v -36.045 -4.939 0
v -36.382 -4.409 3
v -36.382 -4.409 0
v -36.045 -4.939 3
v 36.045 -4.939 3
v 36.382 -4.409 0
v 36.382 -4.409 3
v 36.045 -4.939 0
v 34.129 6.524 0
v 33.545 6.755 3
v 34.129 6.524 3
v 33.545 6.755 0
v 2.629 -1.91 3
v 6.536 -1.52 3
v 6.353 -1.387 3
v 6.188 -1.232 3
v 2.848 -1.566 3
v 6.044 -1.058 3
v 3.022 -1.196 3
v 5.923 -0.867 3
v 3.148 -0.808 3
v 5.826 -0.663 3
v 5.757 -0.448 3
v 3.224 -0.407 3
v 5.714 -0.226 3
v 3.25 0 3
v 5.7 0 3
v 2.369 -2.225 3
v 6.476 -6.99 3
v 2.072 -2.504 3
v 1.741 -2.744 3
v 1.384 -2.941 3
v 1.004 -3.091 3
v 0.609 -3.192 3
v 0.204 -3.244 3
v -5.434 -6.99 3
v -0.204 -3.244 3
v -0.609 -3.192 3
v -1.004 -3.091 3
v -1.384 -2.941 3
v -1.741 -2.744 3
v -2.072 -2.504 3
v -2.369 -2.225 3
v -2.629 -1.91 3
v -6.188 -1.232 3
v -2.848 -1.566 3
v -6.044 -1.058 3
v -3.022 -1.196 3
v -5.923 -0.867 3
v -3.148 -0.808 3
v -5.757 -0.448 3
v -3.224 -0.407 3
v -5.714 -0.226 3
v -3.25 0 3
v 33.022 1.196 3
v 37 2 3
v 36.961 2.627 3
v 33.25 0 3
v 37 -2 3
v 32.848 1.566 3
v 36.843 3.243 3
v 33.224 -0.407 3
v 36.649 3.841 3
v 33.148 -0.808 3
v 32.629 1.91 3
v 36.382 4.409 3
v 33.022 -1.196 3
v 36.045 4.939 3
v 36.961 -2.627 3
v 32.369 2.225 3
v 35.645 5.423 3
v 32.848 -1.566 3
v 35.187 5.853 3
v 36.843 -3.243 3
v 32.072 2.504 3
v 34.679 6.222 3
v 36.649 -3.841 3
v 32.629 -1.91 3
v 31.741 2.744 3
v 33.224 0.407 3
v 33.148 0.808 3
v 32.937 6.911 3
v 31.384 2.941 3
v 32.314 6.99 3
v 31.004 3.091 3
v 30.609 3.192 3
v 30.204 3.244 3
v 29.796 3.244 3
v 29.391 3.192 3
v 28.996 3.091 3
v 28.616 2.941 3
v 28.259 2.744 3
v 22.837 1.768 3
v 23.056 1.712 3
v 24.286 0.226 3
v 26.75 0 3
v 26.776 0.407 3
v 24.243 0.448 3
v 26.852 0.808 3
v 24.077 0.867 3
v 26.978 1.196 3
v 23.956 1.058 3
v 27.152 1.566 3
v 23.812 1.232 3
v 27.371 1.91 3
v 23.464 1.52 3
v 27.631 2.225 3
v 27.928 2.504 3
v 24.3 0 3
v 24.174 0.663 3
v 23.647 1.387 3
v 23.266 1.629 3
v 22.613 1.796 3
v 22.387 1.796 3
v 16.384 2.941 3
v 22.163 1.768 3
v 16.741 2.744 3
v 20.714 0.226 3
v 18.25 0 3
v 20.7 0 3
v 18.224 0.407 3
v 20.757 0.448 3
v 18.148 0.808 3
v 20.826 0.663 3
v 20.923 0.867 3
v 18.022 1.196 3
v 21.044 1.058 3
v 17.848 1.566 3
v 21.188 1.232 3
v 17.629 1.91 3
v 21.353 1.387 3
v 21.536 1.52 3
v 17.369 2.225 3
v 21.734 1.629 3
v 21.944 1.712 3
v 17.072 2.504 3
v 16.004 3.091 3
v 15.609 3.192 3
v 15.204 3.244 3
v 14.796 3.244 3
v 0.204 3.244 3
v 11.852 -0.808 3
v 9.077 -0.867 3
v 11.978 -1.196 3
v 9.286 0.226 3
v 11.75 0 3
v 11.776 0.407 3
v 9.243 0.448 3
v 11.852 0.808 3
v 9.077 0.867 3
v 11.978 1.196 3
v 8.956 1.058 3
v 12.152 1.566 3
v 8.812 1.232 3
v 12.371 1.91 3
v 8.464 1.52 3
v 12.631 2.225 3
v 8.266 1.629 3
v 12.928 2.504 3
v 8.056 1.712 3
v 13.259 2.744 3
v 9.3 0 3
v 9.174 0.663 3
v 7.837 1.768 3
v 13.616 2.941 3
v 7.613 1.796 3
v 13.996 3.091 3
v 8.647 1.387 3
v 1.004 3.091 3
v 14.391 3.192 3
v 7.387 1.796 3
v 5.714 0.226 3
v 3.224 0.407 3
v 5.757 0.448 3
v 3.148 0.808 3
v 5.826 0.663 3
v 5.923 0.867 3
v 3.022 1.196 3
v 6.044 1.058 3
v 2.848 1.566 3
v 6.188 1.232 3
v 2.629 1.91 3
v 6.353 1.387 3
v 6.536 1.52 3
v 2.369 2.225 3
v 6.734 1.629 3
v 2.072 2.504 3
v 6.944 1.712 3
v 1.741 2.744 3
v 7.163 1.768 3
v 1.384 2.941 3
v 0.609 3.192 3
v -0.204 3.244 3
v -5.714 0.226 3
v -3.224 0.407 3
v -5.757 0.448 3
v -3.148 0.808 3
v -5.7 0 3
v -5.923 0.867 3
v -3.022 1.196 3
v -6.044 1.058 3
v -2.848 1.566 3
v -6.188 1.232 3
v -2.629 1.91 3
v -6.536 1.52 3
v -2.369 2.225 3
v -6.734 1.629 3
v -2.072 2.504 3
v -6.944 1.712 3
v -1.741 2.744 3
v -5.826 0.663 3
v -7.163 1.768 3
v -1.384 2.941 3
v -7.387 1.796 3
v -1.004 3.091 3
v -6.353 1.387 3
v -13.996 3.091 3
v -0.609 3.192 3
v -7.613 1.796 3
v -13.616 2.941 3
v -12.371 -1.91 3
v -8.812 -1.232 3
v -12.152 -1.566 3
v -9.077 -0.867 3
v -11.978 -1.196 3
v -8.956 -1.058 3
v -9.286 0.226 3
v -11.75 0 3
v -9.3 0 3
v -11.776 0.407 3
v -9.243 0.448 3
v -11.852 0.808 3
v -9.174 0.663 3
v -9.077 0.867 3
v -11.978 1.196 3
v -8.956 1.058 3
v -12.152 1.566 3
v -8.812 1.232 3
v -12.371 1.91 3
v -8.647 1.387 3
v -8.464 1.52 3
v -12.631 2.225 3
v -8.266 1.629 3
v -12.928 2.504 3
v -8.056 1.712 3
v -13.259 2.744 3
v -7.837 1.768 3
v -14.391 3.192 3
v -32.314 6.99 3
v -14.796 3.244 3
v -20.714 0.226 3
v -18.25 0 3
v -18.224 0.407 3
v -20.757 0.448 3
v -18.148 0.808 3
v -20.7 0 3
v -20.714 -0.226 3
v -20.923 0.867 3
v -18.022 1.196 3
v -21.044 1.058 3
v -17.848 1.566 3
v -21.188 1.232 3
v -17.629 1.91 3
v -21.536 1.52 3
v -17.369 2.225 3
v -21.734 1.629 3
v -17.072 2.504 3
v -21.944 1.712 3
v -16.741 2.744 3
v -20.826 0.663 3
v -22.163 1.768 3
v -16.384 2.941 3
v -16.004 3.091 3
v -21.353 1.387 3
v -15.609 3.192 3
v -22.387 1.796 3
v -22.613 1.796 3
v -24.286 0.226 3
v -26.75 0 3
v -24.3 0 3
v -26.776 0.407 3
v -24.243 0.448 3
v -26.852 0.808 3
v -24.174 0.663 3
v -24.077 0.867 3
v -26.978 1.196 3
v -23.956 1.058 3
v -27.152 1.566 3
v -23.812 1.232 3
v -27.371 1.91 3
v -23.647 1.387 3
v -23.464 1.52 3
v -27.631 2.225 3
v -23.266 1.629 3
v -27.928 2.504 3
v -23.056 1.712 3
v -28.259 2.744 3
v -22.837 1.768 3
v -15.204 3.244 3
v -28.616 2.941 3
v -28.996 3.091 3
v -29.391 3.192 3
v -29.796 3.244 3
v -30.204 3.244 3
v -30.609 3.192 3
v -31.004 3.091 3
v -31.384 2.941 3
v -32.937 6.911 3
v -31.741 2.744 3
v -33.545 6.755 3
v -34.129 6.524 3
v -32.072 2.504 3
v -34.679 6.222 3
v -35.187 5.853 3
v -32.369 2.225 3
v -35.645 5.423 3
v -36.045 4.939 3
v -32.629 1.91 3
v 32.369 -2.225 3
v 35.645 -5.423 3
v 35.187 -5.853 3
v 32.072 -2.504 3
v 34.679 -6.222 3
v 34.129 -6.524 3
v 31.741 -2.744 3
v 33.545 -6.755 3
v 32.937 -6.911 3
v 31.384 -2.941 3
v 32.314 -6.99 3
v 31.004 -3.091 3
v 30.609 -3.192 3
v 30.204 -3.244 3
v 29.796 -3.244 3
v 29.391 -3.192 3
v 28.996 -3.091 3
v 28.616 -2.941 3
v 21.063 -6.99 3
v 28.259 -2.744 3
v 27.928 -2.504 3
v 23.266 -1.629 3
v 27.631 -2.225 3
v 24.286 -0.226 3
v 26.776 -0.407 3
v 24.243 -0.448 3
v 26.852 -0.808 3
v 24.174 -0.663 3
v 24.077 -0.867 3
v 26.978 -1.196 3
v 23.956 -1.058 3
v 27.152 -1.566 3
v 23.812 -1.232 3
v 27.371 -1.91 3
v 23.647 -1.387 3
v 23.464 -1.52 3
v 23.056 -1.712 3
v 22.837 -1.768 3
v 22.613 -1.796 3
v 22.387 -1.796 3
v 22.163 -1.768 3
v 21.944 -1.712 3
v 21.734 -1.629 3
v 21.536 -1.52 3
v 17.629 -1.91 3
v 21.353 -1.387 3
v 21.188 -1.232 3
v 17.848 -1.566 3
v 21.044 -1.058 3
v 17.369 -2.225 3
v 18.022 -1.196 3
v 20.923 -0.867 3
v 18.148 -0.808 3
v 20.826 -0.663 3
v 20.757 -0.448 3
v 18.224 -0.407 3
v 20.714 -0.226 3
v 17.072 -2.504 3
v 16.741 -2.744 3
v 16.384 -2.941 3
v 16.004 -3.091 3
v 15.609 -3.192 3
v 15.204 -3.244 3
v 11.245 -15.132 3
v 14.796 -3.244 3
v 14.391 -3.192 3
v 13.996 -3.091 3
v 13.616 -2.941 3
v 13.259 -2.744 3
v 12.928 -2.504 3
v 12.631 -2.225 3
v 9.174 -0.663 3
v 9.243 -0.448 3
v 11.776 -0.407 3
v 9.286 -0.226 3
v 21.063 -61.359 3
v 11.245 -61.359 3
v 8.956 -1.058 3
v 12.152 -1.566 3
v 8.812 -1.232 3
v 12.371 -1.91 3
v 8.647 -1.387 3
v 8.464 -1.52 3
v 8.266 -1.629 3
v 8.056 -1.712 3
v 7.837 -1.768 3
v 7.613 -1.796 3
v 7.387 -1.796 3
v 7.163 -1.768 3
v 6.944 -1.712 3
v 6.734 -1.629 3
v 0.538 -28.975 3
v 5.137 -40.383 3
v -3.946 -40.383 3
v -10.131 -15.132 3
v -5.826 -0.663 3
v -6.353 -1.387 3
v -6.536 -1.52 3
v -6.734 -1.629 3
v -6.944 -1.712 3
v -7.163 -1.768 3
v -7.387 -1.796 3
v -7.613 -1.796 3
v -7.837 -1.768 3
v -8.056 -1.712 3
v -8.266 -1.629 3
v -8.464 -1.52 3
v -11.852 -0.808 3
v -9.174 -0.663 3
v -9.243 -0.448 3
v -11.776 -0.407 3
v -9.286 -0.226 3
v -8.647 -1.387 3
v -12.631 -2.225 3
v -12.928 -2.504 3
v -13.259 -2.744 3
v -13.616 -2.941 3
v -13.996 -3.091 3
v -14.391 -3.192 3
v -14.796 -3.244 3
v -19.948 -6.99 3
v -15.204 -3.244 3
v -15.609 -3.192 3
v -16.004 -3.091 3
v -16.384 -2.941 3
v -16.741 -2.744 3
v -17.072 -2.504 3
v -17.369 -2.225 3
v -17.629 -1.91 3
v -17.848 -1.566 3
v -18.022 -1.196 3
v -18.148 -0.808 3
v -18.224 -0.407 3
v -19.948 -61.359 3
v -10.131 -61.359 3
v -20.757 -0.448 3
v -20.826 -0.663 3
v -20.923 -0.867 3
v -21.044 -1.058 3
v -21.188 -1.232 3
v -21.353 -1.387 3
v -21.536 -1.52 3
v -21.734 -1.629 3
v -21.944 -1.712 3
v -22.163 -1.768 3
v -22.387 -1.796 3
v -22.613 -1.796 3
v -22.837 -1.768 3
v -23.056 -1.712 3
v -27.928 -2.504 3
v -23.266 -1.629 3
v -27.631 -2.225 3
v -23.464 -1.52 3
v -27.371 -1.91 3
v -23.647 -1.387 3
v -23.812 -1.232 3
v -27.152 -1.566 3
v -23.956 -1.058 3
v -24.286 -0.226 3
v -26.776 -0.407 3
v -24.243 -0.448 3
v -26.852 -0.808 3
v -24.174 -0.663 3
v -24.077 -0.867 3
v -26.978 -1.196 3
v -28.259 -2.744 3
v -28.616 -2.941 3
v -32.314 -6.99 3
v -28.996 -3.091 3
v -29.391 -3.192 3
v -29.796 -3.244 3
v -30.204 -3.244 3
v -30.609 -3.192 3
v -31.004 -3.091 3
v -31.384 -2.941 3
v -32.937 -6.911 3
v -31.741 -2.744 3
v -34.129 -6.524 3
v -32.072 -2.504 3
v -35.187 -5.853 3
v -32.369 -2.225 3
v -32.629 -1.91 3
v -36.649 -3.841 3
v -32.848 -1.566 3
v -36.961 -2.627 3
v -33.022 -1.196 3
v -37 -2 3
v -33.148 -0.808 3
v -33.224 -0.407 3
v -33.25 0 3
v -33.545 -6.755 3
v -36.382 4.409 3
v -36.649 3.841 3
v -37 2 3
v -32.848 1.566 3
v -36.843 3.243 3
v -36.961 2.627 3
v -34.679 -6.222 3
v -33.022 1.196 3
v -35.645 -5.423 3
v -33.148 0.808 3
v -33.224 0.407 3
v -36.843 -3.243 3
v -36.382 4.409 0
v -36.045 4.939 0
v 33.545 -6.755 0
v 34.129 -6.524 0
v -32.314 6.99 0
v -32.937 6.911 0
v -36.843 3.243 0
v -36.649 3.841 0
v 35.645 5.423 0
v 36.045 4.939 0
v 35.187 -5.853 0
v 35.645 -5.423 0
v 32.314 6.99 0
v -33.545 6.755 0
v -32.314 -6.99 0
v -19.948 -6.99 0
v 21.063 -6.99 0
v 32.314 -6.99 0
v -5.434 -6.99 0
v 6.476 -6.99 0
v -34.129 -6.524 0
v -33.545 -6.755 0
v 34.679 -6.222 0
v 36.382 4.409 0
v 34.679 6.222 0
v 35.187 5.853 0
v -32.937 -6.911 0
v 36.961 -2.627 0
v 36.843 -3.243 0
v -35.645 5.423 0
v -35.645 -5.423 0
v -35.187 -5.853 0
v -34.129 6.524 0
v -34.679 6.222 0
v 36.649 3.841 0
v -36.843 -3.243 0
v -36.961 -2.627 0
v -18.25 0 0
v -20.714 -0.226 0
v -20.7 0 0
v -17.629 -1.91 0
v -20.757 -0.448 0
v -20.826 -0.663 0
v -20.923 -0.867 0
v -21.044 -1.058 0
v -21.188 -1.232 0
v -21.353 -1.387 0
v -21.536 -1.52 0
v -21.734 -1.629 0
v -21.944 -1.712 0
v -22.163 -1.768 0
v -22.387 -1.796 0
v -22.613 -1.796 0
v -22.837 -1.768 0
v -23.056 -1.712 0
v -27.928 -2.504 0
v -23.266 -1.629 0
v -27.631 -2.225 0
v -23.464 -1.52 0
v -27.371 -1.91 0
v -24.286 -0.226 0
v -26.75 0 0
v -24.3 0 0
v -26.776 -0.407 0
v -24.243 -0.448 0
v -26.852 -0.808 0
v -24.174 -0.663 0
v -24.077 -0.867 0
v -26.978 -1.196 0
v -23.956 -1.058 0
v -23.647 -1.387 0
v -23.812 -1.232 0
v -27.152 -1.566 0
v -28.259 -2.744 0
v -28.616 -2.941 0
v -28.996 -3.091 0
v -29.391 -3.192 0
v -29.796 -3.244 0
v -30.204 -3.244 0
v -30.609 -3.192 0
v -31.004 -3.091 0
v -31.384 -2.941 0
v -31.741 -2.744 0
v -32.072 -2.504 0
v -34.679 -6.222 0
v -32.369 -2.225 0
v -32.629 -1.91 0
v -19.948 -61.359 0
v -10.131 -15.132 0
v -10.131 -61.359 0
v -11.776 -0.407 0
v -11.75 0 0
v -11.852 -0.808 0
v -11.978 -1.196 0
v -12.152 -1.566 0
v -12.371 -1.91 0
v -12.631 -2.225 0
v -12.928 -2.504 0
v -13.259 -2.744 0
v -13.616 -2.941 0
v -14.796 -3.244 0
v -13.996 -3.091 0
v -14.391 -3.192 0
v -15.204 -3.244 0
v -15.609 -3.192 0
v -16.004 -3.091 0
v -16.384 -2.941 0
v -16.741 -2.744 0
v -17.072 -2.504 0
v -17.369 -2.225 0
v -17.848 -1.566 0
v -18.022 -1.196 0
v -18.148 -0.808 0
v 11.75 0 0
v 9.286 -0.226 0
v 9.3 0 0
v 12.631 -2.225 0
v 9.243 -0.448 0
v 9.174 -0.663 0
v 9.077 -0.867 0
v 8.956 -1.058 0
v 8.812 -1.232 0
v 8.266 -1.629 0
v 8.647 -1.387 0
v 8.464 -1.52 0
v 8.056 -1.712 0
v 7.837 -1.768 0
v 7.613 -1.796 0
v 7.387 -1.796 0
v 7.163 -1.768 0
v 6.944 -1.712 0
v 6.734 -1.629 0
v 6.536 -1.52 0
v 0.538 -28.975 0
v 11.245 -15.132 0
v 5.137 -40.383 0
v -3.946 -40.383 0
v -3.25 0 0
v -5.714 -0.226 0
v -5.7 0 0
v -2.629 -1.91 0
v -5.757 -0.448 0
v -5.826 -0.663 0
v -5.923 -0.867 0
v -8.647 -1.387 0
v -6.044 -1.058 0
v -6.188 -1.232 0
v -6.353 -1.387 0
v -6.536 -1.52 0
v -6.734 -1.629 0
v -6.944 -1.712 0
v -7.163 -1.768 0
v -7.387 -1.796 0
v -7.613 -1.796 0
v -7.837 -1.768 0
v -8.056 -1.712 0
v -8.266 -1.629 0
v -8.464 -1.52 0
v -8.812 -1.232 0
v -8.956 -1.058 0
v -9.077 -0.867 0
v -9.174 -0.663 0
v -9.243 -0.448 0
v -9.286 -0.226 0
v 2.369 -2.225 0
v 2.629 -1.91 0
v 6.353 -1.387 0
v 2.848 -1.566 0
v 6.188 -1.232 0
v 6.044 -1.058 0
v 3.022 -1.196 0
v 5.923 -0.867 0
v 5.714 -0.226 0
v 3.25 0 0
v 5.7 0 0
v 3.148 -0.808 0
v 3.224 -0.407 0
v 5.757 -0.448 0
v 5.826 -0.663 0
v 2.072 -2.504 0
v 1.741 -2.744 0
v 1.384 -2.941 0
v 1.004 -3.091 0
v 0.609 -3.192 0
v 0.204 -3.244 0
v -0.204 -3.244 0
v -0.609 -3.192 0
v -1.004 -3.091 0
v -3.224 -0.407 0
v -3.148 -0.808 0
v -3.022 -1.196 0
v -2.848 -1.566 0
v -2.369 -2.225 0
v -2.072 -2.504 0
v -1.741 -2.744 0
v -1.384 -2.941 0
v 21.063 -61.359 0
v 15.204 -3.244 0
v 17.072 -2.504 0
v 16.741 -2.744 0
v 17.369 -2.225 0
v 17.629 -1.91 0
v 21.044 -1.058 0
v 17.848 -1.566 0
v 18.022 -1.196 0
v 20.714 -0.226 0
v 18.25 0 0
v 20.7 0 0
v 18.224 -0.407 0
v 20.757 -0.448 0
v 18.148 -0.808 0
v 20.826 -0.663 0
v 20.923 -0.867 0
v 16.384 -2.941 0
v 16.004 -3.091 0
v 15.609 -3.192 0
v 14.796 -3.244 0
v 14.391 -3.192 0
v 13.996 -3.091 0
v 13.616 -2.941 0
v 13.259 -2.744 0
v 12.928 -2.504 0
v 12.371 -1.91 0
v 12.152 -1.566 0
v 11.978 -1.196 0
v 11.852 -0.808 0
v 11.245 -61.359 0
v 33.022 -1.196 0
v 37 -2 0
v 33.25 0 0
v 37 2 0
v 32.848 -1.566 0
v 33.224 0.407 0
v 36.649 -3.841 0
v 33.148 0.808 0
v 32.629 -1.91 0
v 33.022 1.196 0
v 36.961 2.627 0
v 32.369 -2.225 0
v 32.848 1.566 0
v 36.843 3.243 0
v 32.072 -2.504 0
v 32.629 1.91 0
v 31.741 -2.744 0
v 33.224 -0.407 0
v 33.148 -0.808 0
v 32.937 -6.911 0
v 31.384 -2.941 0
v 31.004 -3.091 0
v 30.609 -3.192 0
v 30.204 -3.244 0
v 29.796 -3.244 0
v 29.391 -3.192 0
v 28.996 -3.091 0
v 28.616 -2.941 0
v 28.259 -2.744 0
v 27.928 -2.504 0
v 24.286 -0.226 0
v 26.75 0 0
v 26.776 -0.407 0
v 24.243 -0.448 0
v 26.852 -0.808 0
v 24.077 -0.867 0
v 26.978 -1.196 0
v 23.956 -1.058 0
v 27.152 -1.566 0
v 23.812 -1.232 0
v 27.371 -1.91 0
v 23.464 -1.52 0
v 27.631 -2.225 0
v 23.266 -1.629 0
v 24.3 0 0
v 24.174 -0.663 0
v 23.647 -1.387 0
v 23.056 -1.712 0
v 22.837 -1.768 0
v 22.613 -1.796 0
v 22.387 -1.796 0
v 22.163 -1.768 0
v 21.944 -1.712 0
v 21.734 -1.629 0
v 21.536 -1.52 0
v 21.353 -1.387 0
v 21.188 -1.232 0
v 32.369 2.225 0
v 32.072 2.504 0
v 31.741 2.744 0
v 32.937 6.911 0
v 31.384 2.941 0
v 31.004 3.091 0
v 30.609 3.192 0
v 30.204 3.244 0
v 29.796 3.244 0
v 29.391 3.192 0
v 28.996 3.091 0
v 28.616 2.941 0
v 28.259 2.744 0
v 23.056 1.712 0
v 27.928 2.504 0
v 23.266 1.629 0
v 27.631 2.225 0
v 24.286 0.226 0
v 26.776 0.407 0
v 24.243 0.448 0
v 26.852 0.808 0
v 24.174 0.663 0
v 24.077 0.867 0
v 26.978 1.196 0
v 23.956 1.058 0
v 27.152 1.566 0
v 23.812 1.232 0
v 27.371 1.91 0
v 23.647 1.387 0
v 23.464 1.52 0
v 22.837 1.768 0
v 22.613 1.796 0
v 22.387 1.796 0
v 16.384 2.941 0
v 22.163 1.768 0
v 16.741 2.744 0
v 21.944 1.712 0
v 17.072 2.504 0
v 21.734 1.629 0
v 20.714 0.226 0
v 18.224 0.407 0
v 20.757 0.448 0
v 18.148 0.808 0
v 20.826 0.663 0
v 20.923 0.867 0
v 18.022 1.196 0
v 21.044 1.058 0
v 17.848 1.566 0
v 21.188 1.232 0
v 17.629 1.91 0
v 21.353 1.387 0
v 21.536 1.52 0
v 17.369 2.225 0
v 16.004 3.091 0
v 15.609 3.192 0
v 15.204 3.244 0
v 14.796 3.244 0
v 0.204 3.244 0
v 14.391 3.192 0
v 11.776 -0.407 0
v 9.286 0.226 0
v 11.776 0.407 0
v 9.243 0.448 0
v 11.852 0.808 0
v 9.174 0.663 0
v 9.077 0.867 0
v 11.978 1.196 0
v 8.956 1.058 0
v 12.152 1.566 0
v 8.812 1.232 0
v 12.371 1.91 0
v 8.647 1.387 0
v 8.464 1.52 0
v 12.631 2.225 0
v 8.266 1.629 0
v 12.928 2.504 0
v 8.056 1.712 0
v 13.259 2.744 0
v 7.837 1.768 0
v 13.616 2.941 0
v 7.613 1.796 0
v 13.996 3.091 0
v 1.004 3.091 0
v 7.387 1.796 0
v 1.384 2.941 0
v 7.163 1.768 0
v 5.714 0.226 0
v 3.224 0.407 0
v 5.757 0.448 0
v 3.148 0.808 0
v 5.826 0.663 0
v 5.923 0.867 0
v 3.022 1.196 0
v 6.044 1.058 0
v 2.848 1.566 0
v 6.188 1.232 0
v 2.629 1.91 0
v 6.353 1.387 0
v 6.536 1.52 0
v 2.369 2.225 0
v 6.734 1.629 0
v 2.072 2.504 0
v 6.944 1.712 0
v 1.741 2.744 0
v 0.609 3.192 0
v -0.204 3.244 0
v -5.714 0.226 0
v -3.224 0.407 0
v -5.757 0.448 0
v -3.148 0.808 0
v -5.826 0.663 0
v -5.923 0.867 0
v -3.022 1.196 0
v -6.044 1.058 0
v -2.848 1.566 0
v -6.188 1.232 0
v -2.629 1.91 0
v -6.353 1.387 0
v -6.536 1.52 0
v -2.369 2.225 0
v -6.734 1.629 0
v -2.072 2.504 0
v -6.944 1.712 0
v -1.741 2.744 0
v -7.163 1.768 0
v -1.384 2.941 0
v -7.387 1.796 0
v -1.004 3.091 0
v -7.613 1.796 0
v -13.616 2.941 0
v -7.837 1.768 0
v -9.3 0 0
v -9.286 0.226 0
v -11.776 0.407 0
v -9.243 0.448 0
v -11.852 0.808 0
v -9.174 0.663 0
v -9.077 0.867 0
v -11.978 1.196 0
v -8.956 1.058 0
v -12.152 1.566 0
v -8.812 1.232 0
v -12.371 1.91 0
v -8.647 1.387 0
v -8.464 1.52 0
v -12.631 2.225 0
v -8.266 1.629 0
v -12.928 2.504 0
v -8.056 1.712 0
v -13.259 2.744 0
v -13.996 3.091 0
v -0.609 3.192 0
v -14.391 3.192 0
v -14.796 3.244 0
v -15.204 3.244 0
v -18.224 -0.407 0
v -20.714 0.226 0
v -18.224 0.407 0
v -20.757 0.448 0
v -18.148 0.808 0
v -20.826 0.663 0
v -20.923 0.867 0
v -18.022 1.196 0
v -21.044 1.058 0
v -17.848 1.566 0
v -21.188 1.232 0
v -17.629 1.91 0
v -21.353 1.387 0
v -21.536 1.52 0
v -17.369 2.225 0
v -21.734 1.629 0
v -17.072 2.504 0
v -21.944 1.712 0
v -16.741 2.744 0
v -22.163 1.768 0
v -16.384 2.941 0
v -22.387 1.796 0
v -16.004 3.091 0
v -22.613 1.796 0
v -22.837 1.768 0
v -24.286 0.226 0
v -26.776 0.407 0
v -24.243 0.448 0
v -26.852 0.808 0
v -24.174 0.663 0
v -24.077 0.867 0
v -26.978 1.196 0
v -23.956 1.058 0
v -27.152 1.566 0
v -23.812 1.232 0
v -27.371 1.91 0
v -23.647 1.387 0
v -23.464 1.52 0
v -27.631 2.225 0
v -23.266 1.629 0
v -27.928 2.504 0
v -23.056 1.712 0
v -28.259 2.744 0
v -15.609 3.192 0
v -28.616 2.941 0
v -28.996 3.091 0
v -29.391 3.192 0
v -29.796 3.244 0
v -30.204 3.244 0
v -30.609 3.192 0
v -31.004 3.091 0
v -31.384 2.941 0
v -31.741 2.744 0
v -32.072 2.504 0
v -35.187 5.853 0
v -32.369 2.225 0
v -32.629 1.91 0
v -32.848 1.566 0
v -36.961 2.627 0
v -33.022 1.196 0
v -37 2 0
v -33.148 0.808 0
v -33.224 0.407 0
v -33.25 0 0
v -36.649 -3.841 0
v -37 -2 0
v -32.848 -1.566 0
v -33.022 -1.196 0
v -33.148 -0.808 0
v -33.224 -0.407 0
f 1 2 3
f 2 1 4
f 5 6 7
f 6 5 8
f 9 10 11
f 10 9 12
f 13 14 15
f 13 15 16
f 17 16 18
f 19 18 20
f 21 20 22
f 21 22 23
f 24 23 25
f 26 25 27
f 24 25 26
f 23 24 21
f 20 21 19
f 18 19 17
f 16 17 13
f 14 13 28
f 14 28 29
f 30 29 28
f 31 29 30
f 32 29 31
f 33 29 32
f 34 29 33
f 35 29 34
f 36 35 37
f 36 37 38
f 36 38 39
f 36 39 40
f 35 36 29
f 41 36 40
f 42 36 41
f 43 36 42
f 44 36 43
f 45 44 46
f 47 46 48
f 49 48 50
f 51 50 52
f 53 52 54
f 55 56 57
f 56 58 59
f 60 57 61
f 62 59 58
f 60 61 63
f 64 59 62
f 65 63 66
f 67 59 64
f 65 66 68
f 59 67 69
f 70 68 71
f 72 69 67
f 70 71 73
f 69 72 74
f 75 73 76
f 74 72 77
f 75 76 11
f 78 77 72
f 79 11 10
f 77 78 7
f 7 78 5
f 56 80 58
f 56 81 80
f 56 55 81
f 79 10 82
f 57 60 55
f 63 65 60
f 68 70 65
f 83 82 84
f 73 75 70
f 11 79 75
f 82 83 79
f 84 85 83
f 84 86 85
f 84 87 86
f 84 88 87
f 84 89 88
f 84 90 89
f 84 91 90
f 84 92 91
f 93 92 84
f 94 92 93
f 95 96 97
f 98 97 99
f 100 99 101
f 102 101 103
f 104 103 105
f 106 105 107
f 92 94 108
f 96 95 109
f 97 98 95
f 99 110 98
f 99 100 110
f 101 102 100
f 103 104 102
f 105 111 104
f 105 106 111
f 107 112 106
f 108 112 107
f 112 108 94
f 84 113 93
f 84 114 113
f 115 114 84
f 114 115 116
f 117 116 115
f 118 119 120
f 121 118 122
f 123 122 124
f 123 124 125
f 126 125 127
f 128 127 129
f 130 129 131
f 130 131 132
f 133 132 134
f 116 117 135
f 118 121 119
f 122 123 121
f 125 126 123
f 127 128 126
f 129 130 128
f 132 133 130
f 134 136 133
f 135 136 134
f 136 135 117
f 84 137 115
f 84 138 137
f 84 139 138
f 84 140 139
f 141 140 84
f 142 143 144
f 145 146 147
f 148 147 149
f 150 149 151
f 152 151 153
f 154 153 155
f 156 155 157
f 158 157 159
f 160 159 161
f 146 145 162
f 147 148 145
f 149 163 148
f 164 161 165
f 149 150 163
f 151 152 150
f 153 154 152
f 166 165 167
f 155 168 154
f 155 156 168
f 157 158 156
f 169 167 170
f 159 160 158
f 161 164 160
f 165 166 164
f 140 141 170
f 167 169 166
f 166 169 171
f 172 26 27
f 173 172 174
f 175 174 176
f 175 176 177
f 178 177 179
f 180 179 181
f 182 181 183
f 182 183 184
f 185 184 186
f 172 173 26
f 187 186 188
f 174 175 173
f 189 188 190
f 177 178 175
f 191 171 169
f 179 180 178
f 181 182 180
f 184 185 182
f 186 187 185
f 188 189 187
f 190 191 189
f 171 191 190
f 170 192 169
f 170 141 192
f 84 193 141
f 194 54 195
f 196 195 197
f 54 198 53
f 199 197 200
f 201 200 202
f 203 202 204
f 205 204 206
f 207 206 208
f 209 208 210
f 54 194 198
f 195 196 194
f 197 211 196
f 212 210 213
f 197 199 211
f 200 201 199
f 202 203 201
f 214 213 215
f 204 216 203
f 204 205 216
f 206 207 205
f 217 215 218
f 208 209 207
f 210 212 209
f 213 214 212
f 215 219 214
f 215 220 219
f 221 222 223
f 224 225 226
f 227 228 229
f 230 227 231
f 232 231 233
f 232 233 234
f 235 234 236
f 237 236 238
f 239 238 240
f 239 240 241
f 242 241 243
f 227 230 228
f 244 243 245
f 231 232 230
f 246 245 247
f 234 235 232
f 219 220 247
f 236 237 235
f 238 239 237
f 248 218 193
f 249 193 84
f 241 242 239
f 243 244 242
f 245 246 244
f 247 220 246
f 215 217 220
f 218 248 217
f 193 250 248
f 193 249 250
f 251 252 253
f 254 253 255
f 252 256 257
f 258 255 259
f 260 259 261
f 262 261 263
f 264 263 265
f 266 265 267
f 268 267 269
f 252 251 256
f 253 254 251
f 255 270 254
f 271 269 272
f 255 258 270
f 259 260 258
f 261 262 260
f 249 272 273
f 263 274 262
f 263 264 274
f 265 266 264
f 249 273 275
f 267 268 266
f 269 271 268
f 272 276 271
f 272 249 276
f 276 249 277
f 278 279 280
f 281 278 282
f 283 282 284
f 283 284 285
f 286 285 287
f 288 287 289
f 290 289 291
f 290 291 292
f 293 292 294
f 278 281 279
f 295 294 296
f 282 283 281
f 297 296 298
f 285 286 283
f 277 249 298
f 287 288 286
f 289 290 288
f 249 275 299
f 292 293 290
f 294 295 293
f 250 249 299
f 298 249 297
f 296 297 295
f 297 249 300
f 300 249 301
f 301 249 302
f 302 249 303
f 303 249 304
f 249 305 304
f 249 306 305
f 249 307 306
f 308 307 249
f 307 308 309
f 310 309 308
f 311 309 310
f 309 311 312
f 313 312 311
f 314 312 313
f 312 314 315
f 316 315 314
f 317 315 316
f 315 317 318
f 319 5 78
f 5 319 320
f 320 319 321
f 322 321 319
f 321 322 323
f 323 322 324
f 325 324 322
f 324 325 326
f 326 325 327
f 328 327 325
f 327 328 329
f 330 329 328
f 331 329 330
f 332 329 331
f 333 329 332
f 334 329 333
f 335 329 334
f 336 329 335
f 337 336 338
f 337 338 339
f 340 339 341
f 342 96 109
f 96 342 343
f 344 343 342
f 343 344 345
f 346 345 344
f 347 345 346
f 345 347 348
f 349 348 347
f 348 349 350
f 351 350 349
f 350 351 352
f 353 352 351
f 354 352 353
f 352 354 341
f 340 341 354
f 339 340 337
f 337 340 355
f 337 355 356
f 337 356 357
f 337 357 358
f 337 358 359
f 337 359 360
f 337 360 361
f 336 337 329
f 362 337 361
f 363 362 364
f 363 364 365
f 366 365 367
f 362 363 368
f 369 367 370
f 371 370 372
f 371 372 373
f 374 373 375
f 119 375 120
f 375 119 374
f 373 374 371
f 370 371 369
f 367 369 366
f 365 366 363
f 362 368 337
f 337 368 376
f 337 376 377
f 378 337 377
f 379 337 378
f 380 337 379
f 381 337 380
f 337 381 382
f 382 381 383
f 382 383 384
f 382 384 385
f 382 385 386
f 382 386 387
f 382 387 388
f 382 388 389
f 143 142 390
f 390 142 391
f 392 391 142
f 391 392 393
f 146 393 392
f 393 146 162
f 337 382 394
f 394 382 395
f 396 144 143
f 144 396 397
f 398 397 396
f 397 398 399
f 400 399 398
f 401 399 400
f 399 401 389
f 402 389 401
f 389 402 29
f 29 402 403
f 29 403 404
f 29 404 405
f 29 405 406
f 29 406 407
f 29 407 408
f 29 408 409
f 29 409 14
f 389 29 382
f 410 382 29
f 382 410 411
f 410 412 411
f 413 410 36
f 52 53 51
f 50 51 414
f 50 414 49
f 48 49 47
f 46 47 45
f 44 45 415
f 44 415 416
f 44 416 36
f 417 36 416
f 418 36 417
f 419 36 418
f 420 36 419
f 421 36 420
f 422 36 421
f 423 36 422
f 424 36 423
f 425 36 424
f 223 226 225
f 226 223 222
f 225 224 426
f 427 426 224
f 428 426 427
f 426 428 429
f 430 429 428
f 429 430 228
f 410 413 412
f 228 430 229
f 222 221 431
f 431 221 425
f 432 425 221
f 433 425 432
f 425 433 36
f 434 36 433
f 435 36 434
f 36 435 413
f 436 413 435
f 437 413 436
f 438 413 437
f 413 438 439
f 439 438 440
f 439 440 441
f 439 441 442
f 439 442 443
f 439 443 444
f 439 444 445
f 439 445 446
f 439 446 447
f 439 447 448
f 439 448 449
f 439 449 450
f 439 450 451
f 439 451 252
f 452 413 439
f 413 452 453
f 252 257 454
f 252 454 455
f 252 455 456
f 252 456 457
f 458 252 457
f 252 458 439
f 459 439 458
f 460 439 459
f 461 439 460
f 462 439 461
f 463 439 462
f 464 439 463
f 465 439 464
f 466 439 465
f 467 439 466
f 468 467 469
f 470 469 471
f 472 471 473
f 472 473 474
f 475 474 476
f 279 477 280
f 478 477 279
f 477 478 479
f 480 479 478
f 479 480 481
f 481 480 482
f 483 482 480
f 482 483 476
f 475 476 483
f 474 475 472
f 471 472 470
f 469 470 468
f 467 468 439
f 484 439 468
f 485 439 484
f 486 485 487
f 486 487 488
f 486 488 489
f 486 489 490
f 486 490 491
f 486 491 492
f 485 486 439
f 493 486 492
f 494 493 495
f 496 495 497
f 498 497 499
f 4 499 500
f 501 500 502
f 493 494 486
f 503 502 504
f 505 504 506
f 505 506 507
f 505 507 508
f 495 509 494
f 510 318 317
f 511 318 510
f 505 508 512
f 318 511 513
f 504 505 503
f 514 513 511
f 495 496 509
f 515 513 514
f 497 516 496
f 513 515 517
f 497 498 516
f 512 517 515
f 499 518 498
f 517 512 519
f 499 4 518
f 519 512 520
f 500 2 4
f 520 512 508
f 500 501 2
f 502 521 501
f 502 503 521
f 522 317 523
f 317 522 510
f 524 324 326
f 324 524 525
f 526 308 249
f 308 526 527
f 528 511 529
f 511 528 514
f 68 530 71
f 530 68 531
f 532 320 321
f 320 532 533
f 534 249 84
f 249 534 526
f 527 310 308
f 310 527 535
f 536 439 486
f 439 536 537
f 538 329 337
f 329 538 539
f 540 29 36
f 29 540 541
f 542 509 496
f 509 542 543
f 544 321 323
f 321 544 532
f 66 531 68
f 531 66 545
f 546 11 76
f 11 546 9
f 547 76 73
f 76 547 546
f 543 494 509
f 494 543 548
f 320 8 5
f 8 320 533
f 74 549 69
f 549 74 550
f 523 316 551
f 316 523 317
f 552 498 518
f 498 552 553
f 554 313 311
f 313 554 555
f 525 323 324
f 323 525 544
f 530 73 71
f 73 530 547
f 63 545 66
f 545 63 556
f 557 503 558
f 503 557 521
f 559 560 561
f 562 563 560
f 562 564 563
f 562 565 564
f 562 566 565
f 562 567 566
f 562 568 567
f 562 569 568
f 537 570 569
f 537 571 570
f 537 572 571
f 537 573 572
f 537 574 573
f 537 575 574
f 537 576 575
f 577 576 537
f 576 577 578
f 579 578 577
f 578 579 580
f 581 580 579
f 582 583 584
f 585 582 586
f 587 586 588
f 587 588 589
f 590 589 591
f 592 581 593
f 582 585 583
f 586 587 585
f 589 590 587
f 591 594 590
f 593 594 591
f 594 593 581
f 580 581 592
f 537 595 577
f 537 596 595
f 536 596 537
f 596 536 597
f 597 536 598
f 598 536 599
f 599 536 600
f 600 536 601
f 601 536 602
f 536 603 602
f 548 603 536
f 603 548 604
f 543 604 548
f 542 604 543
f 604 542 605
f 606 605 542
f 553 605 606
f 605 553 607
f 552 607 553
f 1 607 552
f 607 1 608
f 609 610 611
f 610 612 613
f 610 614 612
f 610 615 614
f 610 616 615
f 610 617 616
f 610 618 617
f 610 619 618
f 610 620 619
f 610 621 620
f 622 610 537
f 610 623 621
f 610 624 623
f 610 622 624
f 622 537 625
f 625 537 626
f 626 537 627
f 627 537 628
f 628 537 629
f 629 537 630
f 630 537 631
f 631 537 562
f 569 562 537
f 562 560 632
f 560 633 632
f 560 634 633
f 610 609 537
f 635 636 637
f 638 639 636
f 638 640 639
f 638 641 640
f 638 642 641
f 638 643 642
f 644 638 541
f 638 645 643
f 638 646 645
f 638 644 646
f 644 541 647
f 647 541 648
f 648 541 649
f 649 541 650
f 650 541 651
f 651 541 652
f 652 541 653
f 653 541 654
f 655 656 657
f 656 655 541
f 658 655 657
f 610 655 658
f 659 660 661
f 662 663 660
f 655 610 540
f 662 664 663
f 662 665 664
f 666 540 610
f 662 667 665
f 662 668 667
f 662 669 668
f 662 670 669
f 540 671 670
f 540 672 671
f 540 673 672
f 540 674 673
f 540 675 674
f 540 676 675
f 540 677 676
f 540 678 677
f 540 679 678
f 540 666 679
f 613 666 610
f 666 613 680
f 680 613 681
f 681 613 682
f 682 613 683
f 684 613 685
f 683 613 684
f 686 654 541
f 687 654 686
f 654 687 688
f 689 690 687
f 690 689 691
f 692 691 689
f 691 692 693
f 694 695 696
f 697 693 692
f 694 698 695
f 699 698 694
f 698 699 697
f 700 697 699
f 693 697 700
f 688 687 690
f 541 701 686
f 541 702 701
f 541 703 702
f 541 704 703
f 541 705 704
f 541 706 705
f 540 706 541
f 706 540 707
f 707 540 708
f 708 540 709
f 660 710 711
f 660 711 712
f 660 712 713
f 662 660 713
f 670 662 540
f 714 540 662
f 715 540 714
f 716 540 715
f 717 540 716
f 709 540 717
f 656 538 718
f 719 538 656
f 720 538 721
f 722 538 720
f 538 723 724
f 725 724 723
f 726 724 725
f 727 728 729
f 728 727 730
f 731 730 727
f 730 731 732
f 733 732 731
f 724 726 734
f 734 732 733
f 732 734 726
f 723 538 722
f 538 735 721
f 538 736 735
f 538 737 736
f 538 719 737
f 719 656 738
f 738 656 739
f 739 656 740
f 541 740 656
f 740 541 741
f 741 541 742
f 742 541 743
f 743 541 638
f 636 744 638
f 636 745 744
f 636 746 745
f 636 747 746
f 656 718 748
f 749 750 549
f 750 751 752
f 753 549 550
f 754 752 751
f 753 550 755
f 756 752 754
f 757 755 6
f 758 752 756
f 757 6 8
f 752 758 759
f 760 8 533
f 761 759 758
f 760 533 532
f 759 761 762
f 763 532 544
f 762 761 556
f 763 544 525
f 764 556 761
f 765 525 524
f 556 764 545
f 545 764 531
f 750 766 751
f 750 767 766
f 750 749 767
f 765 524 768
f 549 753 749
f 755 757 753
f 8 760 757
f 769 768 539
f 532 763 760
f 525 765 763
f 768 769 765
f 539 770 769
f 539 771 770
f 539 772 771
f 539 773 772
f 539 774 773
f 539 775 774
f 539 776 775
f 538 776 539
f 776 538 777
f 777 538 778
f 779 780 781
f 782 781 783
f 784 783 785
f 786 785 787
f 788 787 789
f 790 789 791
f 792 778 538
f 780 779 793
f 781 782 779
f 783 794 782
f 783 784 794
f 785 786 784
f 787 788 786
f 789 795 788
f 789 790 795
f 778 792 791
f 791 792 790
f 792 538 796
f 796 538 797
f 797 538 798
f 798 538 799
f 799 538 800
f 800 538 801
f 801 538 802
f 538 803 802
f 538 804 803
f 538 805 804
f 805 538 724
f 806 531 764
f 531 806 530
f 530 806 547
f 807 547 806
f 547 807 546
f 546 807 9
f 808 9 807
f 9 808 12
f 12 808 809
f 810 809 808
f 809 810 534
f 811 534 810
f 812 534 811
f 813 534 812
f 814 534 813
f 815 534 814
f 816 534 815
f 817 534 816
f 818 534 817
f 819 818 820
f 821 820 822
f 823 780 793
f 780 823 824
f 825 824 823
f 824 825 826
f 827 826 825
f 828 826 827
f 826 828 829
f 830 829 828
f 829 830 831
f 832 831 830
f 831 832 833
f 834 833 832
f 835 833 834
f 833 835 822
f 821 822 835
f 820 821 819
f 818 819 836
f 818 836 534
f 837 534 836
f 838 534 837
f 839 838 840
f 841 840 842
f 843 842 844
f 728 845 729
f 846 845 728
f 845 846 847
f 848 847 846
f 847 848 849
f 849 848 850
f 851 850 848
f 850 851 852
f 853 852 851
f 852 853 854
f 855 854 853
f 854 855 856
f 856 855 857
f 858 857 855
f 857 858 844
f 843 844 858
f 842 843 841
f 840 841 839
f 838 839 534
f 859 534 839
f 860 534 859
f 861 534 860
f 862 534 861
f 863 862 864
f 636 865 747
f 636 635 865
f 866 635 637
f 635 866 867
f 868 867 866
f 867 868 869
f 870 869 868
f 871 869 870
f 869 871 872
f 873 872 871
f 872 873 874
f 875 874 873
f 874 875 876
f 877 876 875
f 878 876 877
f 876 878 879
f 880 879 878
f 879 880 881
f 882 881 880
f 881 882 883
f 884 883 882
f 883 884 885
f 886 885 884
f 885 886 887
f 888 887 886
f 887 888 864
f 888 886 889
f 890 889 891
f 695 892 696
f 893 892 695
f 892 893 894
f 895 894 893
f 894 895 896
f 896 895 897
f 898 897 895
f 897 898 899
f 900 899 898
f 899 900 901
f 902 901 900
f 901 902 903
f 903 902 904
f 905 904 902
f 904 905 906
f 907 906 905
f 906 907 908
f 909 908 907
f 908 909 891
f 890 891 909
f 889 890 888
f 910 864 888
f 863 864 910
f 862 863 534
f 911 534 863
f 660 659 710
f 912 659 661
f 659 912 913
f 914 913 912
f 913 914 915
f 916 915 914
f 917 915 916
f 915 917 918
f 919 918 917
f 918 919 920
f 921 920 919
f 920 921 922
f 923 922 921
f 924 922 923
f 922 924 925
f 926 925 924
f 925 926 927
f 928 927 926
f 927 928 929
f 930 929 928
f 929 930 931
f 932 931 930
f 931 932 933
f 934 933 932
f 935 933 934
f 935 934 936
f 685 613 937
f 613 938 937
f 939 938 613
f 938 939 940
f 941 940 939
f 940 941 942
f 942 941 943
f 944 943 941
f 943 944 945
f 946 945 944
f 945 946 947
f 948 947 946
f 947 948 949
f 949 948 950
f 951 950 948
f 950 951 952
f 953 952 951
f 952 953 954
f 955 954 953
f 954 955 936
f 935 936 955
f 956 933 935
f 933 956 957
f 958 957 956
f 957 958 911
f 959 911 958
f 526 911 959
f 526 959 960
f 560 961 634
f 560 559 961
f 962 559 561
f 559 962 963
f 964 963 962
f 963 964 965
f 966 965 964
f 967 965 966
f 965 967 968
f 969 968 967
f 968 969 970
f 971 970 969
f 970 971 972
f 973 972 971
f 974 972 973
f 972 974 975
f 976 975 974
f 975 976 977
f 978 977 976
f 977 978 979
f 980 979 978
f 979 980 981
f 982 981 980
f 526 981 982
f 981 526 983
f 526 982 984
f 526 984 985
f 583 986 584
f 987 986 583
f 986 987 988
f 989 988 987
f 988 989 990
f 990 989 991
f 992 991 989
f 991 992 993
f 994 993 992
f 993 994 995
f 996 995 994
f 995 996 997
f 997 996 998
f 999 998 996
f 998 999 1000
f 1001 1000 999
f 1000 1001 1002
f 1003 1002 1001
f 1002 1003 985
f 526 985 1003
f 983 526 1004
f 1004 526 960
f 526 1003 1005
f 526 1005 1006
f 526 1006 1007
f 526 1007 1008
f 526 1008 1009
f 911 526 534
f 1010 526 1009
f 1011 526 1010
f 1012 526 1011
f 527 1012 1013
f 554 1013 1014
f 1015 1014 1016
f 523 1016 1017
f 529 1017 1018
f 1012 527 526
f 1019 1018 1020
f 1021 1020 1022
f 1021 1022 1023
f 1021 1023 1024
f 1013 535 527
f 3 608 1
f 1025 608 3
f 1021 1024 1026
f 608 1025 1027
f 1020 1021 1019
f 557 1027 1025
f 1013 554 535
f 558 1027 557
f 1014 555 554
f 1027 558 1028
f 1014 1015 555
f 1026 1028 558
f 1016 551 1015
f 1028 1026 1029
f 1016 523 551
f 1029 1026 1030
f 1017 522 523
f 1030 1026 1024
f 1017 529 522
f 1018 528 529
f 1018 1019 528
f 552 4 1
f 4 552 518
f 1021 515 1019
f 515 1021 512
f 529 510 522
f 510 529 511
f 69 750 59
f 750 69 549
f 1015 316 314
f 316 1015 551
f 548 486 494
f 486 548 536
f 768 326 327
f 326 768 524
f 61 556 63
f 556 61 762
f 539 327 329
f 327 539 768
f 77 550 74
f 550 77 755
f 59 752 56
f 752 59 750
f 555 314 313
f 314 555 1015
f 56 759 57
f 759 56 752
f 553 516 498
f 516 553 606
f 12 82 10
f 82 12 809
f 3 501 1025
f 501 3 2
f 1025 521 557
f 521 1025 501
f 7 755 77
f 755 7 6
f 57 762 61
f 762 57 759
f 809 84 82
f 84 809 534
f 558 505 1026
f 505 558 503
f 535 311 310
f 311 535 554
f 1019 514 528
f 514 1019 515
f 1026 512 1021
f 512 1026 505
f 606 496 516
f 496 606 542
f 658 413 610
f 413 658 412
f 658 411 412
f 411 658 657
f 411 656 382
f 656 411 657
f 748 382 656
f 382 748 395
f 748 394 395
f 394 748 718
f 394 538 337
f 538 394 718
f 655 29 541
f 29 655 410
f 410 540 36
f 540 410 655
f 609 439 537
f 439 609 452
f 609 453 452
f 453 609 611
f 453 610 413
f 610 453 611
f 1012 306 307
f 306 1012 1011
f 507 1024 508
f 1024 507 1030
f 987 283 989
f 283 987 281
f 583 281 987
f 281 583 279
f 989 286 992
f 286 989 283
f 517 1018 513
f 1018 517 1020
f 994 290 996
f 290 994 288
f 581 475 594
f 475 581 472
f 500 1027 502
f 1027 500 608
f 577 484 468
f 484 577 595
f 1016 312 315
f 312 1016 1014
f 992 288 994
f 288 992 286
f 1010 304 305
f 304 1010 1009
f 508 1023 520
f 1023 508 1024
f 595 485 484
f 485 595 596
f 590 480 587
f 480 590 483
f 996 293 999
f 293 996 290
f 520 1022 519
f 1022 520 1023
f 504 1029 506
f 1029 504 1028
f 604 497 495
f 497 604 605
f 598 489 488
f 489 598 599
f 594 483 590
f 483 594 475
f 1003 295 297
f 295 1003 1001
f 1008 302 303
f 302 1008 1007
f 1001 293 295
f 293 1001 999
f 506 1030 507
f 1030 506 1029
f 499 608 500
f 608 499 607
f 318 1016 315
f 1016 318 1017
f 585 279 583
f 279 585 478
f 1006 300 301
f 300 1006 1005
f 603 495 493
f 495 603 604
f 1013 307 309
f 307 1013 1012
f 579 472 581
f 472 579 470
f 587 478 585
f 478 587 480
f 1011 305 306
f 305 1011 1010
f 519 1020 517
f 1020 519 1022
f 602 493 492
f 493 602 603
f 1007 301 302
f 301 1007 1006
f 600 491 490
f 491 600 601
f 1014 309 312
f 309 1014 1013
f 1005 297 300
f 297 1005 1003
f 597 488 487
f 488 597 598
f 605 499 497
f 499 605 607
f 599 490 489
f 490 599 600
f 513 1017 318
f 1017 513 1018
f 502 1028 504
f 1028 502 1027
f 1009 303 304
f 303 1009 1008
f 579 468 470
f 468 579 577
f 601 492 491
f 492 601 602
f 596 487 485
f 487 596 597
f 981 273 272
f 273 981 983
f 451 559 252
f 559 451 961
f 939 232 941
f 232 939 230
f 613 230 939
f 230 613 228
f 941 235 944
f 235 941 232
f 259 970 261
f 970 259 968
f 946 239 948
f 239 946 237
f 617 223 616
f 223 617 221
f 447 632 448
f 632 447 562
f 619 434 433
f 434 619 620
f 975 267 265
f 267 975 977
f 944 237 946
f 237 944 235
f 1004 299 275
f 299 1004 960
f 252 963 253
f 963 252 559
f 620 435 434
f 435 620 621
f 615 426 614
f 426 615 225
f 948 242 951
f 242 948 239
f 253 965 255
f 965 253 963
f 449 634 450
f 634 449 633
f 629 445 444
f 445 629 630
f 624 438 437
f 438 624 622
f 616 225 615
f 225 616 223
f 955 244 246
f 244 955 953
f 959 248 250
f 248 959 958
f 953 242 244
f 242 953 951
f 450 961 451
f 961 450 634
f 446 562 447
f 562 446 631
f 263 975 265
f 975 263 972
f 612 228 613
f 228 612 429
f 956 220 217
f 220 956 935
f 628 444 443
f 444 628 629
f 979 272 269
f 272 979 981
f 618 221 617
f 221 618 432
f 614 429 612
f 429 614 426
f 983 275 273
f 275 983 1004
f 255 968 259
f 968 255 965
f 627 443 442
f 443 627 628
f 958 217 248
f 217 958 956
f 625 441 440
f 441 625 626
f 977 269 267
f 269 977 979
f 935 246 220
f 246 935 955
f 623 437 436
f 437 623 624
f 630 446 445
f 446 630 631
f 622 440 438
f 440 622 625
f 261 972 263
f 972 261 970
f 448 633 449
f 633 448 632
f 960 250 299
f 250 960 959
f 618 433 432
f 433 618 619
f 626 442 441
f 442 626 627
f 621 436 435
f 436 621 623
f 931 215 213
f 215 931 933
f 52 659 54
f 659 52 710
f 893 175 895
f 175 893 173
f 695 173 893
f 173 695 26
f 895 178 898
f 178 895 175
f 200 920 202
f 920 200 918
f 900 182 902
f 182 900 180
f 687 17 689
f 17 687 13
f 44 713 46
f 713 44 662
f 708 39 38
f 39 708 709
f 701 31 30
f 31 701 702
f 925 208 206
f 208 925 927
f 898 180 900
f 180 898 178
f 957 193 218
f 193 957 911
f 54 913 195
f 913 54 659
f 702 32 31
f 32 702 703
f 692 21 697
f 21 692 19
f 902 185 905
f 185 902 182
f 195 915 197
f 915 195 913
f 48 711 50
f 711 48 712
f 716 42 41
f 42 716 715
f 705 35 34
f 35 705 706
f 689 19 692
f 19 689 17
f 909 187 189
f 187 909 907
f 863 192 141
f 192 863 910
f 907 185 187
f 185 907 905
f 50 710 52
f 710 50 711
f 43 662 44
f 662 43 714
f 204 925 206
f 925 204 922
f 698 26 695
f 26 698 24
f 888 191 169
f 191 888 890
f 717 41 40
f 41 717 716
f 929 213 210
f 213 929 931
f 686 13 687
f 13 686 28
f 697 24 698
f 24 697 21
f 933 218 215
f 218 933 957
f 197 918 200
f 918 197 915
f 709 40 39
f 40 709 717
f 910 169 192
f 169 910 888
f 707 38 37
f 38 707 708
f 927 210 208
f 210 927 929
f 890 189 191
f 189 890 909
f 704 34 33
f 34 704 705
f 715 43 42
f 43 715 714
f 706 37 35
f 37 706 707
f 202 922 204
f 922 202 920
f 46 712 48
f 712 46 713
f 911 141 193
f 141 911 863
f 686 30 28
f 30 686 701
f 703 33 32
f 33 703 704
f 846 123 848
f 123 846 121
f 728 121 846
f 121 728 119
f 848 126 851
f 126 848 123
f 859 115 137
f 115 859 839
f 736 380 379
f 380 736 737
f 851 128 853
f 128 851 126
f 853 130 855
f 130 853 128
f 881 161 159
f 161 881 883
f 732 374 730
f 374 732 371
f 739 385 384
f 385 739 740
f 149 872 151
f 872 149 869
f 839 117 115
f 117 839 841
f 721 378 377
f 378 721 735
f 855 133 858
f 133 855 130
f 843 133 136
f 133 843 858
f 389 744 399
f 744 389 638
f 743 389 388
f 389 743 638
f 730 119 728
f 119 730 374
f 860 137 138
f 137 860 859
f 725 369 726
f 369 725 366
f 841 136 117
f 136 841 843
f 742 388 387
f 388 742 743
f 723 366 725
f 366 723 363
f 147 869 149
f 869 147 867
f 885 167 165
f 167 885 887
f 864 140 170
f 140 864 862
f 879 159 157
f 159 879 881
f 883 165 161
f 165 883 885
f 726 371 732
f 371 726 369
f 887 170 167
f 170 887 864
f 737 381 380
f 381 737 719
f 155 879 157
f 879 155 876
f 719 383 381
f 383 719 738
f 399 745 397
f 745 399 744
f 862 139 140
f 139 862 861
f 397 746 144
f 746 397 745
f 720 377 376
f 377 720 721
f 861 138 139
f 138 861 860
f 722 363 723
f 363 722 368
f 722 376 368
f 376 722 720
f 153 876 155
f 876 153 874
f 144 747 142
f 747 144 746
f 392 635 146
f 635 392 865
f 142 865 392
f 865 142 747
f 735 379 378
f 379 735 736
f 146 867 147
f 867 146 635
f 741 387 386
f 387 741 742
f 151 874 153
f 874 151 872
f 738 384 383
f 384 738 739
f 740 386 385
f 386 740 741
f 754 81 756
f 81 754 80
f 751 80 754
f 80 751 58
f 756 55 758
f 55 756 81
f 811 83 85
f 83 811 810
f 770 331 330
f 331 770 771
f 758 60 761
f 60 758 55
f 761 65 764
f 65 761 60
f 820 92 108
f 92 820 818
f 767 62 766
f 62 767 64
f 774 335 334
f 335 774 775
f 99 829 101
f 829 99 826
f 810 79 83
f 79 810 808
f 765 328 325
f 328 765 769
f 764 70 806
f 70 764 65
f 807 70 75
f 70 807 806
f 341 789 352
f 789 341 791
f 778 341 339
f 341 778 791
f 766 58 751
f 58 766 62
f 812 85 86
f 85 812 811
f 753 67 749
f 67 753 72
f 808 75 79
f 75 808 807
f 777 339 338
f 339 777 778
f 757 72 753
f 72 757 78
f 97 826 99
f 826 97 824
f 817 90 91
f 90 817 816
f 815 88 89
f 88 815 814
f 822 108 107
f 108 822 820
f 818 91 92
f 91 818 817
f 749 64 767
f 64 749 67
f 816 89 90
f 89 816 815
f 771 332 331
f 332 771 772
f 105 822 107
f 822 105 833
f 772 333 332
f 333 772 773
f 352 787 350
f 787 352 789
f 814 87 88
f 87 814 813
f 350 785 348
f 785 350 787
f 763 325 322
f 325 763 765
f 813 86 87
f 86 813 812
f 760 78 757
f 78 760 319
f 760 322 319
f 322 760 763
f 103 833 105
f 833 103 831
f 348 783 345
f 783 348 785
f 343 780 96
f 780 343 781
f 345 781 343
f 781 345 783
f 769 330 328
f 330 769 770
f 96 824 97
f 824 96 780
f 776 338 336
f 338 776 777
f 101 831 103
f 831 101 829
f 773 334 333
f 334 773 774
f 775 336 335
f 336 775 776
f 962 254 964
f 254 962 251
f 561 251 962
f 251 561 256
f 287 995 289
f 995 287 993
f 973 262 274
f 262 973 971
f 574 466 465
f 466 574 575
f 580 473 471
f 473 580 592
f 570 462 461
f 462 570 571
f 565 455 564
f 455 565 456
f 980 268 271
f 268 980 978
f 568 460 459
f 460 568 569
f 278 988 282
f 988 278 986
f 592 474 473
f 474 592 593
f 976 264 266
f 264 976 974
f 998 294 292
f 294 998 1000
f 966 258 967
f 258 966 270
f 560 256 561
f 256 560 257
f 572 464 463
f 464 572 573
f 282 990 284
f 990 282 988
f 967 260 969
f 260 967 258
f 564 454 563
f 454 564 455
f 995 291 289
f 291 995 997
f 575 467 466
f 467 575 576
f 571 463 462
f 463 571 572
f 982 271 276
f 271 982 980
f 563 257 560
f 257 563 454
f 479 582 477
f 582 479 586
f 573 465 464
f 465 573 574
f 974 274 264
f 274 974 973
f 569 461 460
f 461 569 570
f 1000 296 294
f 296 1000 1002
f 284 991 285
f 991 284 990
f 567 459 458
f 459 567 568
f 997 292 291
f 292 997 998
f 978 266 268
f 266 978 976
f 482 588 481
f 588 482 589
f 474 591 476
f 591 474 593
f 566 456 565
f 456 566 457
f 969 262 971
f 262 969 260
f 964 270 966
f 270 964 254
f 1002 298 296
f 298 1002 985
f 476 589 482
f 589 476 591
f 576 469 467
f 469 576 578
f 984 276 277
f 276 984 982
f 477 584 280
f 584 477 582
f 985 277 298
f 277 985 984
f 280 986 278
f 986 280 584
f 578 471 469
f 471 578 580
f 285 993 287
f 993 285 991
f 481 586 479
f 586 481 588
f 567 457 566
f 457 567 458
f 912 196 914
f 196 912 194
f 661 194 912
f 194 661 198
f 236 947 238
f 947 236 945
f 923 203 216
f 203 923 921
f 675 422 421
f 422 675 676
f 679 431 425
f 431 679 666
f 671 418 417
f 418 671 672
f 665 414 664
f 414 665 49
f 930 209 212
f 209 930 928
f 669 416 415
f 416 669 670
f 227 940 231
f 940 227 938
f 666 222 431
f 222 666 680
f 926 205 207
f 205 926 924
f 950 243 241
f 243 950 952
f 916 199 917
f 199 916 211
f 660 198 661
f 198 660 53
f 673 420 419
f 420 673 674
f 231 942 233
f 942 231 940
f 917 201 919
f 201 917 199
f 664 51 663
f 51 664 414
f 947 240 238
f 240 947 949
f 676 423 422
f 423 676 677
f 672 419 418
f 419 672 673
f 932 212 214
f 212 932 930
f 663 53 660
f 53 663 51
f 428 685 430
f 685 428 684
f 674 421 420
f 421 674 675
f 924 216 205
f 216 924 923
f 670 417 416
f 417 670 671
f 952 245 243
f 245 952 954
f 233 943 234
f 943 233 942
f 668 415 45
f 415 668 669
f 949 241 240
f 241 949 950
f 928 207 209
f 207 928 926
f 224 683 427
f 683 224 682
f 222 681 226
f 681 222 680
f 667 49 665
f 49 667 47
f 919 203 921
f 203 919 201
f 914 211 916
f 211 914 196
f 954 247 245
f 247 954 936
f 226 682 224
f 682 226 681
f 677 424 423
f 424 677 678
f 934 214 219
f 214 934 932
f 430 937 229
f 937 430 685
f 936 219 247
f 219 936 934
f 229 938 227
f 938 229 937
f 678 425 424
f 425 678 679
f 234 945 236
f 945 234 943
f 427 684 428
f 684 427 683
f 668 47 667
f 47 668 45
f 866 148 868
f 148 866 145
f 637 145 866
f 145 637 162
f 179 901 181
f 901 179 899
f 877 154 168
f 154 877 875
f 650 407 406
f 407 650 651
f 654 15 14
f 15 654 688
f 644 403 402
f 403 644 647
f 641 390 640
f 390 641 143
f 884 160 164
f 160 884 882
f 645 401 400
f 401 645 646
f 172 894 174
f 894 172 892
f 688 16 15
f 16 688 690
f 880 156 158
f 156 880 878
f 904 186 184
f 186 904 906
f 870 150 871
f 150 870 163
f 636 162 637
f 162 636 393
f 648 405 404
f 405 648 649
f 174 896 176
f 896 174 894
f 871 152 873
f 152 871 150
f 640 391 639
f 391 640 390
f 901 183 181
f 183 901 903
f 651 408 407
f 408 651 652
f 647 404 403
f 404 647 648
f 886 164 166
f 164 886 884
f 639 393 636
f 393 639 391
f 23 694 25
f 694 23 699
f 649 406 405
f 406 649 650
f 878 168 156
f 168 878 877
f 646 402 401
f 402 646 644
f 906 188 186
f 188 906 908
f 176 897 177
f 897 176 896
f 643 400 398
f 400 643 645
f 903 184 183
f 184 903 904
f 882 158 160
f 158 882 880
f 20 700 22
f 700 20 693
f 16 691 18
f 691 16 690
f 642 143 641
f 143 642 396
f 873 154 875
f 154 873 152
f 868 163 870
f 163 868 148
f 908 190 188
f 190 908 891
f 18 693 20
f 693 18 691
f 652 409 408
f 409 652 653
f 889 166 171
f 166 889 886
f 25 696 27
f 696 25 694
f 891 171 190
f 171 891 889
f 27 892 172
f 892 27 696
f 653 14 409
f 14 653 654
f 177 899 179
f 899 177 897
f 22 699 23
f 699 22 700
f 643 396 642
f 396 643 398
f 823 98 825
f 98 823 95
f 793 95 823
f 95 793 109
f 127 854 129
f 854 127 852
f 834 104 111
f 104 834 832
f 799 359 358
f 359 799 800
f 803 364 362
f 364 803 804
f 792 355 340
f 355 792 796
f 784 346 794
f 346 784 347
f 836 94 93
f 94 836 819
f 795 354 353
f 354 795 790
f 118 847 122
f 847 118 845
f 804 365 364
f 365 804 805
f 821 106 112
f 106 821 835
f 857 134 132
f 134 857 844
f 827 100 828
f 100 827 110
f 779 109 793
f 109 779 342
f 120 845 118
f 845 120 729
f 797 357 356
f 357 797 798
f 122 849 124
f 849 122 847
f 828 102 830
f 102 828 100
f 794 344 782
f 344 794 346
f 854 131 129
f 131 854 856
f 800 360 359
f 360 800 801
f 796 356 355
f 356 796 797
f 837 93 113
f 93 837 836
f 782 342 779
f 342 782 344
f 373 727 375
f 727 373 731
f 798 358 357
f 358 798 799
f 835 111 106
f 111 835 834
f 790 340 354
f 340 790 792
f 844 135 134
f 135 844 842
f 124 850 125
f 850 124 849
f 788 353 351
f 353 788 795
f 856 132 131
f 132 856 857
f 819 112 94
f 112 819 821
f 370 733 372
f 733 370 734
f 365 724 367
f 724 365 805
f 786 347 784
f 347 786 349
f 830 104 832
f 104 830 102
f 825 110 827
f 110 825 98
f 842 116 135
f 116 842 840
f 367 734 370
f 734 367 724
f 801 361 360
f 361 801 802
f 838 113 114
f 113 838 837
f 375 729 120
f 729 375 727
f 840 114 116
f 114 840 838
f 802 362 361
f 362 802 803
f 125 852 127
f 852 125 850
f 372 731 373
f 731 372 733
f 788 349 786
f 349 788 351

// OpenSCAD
$fn = 50;


difference() {
	union() {
		hull() {
			translate(v = [-32.0000000000, 2.0000000000, 0]) {
				cylinder(h = 3, r = 5);
			}
			translate(v = [32.0000000000, 2.0000000000, 0]) {
				cylinder(h = 3, r = 5);
			}
			translate(v = [-32.0000000000, -2.0000000000, 0]) {
				cylinder(h = 3, r = 5);
			}
			translate(v = [32.0000000000, -2.0000000000, 0]) {
				cylinder(h = 3, r = 5);
			}
		}
		translate(v = [0, -5, 0]) {
			linear_extrude(height = 3) {
				text(font = "DejaVu Sans Mono:style=Bold", halign = "center", size = 57.0000000000, text = "M", valign = "top");
			}
		}
	}
	union() {
		translate(v = [-30.0000000000, 0.0000000000, 0]) {
			translate(v = [0, 0, -100]) {
				cylinder(h = 200, r = 3.2500000000);
			}
		}
		translate(v = [-15.0000000000, 0.0000000000, 0]) {
			translate(v = [0, 0, -100]) {
				cylinder(h = 200, r = 3.2500000000);
			}
		}
		translate(v = [0, 0, -100]) {
			cylinder(h = 200, r = 3.2500000000);
		}
		translate(v = [15.0000000000, 0.0000000000, 0]) {
			translate(v = [0, 0, -100]) {
				cylinder(h = 200, r = 3.2500000000);
			}
		}
		translate(v = [30.0000000000, 0.0000000000, 0]) {
			translate(v = [0, 0, -100]) {
				cylinder(h = 200, r = 3.2500000000);
			}
		}
		translate(v = [-30.0000000000, 0.0000000000, 0]) {
			translate(v = [0, 0, -100]) {
				cylinder(h = 200, r = 1.8000000000);
			}
		}
		translate(v = [-22.5000000000, 0.0000000000, 0]) {
			translate(v = [0, 0, -100]) {
				cylinder(h = 200, r = 1.8000000000);
			}
		}
		translate(v = [-15.0000000000, 0.0000000000, 0]) {
			translate(v = [0, 0, -100]) {
				cylinder(h = 200, r = 1.8000000000);
			}
		}
		translate(v = [-7.5000000000, 0.0000000000, 0]) {
			translate(v = [0, 0, -100]) {
				cylinder(h = 200, r = 1.8000000000);
			}
		}
		translate(v = [0, 0, -100]) {
			cylinder(h = 200, r = 1.8000000000);
		}
		translate(v = [7.5000000000, 0.0000000000, 0]) {
			translate(v = [0, 0, -100]) {
				cylinder(h = 200, r = 1.8000000000);
			}
		}
		translate(v = [15.0000000000, 0.0000000000, 0]) {
			translate(v = [0, 0, -100]) {
				cylinder(h = 200, r = 1.8000000000);
			}
		}
		translate(v = [22.5000000000, 0.0000000000, 0]) {
			translate(v = [0, 0, -100]) {
				cylinder(h = 200, r = 1.8000000000);
			}
		}
		translate(v = [30.0000000000, 0.0000000000, 0]) {
			translate(v = [0, 0, -100]) {
				cylinder(h = 200, r = 1.8000000000);
			}
		}
	}
}
